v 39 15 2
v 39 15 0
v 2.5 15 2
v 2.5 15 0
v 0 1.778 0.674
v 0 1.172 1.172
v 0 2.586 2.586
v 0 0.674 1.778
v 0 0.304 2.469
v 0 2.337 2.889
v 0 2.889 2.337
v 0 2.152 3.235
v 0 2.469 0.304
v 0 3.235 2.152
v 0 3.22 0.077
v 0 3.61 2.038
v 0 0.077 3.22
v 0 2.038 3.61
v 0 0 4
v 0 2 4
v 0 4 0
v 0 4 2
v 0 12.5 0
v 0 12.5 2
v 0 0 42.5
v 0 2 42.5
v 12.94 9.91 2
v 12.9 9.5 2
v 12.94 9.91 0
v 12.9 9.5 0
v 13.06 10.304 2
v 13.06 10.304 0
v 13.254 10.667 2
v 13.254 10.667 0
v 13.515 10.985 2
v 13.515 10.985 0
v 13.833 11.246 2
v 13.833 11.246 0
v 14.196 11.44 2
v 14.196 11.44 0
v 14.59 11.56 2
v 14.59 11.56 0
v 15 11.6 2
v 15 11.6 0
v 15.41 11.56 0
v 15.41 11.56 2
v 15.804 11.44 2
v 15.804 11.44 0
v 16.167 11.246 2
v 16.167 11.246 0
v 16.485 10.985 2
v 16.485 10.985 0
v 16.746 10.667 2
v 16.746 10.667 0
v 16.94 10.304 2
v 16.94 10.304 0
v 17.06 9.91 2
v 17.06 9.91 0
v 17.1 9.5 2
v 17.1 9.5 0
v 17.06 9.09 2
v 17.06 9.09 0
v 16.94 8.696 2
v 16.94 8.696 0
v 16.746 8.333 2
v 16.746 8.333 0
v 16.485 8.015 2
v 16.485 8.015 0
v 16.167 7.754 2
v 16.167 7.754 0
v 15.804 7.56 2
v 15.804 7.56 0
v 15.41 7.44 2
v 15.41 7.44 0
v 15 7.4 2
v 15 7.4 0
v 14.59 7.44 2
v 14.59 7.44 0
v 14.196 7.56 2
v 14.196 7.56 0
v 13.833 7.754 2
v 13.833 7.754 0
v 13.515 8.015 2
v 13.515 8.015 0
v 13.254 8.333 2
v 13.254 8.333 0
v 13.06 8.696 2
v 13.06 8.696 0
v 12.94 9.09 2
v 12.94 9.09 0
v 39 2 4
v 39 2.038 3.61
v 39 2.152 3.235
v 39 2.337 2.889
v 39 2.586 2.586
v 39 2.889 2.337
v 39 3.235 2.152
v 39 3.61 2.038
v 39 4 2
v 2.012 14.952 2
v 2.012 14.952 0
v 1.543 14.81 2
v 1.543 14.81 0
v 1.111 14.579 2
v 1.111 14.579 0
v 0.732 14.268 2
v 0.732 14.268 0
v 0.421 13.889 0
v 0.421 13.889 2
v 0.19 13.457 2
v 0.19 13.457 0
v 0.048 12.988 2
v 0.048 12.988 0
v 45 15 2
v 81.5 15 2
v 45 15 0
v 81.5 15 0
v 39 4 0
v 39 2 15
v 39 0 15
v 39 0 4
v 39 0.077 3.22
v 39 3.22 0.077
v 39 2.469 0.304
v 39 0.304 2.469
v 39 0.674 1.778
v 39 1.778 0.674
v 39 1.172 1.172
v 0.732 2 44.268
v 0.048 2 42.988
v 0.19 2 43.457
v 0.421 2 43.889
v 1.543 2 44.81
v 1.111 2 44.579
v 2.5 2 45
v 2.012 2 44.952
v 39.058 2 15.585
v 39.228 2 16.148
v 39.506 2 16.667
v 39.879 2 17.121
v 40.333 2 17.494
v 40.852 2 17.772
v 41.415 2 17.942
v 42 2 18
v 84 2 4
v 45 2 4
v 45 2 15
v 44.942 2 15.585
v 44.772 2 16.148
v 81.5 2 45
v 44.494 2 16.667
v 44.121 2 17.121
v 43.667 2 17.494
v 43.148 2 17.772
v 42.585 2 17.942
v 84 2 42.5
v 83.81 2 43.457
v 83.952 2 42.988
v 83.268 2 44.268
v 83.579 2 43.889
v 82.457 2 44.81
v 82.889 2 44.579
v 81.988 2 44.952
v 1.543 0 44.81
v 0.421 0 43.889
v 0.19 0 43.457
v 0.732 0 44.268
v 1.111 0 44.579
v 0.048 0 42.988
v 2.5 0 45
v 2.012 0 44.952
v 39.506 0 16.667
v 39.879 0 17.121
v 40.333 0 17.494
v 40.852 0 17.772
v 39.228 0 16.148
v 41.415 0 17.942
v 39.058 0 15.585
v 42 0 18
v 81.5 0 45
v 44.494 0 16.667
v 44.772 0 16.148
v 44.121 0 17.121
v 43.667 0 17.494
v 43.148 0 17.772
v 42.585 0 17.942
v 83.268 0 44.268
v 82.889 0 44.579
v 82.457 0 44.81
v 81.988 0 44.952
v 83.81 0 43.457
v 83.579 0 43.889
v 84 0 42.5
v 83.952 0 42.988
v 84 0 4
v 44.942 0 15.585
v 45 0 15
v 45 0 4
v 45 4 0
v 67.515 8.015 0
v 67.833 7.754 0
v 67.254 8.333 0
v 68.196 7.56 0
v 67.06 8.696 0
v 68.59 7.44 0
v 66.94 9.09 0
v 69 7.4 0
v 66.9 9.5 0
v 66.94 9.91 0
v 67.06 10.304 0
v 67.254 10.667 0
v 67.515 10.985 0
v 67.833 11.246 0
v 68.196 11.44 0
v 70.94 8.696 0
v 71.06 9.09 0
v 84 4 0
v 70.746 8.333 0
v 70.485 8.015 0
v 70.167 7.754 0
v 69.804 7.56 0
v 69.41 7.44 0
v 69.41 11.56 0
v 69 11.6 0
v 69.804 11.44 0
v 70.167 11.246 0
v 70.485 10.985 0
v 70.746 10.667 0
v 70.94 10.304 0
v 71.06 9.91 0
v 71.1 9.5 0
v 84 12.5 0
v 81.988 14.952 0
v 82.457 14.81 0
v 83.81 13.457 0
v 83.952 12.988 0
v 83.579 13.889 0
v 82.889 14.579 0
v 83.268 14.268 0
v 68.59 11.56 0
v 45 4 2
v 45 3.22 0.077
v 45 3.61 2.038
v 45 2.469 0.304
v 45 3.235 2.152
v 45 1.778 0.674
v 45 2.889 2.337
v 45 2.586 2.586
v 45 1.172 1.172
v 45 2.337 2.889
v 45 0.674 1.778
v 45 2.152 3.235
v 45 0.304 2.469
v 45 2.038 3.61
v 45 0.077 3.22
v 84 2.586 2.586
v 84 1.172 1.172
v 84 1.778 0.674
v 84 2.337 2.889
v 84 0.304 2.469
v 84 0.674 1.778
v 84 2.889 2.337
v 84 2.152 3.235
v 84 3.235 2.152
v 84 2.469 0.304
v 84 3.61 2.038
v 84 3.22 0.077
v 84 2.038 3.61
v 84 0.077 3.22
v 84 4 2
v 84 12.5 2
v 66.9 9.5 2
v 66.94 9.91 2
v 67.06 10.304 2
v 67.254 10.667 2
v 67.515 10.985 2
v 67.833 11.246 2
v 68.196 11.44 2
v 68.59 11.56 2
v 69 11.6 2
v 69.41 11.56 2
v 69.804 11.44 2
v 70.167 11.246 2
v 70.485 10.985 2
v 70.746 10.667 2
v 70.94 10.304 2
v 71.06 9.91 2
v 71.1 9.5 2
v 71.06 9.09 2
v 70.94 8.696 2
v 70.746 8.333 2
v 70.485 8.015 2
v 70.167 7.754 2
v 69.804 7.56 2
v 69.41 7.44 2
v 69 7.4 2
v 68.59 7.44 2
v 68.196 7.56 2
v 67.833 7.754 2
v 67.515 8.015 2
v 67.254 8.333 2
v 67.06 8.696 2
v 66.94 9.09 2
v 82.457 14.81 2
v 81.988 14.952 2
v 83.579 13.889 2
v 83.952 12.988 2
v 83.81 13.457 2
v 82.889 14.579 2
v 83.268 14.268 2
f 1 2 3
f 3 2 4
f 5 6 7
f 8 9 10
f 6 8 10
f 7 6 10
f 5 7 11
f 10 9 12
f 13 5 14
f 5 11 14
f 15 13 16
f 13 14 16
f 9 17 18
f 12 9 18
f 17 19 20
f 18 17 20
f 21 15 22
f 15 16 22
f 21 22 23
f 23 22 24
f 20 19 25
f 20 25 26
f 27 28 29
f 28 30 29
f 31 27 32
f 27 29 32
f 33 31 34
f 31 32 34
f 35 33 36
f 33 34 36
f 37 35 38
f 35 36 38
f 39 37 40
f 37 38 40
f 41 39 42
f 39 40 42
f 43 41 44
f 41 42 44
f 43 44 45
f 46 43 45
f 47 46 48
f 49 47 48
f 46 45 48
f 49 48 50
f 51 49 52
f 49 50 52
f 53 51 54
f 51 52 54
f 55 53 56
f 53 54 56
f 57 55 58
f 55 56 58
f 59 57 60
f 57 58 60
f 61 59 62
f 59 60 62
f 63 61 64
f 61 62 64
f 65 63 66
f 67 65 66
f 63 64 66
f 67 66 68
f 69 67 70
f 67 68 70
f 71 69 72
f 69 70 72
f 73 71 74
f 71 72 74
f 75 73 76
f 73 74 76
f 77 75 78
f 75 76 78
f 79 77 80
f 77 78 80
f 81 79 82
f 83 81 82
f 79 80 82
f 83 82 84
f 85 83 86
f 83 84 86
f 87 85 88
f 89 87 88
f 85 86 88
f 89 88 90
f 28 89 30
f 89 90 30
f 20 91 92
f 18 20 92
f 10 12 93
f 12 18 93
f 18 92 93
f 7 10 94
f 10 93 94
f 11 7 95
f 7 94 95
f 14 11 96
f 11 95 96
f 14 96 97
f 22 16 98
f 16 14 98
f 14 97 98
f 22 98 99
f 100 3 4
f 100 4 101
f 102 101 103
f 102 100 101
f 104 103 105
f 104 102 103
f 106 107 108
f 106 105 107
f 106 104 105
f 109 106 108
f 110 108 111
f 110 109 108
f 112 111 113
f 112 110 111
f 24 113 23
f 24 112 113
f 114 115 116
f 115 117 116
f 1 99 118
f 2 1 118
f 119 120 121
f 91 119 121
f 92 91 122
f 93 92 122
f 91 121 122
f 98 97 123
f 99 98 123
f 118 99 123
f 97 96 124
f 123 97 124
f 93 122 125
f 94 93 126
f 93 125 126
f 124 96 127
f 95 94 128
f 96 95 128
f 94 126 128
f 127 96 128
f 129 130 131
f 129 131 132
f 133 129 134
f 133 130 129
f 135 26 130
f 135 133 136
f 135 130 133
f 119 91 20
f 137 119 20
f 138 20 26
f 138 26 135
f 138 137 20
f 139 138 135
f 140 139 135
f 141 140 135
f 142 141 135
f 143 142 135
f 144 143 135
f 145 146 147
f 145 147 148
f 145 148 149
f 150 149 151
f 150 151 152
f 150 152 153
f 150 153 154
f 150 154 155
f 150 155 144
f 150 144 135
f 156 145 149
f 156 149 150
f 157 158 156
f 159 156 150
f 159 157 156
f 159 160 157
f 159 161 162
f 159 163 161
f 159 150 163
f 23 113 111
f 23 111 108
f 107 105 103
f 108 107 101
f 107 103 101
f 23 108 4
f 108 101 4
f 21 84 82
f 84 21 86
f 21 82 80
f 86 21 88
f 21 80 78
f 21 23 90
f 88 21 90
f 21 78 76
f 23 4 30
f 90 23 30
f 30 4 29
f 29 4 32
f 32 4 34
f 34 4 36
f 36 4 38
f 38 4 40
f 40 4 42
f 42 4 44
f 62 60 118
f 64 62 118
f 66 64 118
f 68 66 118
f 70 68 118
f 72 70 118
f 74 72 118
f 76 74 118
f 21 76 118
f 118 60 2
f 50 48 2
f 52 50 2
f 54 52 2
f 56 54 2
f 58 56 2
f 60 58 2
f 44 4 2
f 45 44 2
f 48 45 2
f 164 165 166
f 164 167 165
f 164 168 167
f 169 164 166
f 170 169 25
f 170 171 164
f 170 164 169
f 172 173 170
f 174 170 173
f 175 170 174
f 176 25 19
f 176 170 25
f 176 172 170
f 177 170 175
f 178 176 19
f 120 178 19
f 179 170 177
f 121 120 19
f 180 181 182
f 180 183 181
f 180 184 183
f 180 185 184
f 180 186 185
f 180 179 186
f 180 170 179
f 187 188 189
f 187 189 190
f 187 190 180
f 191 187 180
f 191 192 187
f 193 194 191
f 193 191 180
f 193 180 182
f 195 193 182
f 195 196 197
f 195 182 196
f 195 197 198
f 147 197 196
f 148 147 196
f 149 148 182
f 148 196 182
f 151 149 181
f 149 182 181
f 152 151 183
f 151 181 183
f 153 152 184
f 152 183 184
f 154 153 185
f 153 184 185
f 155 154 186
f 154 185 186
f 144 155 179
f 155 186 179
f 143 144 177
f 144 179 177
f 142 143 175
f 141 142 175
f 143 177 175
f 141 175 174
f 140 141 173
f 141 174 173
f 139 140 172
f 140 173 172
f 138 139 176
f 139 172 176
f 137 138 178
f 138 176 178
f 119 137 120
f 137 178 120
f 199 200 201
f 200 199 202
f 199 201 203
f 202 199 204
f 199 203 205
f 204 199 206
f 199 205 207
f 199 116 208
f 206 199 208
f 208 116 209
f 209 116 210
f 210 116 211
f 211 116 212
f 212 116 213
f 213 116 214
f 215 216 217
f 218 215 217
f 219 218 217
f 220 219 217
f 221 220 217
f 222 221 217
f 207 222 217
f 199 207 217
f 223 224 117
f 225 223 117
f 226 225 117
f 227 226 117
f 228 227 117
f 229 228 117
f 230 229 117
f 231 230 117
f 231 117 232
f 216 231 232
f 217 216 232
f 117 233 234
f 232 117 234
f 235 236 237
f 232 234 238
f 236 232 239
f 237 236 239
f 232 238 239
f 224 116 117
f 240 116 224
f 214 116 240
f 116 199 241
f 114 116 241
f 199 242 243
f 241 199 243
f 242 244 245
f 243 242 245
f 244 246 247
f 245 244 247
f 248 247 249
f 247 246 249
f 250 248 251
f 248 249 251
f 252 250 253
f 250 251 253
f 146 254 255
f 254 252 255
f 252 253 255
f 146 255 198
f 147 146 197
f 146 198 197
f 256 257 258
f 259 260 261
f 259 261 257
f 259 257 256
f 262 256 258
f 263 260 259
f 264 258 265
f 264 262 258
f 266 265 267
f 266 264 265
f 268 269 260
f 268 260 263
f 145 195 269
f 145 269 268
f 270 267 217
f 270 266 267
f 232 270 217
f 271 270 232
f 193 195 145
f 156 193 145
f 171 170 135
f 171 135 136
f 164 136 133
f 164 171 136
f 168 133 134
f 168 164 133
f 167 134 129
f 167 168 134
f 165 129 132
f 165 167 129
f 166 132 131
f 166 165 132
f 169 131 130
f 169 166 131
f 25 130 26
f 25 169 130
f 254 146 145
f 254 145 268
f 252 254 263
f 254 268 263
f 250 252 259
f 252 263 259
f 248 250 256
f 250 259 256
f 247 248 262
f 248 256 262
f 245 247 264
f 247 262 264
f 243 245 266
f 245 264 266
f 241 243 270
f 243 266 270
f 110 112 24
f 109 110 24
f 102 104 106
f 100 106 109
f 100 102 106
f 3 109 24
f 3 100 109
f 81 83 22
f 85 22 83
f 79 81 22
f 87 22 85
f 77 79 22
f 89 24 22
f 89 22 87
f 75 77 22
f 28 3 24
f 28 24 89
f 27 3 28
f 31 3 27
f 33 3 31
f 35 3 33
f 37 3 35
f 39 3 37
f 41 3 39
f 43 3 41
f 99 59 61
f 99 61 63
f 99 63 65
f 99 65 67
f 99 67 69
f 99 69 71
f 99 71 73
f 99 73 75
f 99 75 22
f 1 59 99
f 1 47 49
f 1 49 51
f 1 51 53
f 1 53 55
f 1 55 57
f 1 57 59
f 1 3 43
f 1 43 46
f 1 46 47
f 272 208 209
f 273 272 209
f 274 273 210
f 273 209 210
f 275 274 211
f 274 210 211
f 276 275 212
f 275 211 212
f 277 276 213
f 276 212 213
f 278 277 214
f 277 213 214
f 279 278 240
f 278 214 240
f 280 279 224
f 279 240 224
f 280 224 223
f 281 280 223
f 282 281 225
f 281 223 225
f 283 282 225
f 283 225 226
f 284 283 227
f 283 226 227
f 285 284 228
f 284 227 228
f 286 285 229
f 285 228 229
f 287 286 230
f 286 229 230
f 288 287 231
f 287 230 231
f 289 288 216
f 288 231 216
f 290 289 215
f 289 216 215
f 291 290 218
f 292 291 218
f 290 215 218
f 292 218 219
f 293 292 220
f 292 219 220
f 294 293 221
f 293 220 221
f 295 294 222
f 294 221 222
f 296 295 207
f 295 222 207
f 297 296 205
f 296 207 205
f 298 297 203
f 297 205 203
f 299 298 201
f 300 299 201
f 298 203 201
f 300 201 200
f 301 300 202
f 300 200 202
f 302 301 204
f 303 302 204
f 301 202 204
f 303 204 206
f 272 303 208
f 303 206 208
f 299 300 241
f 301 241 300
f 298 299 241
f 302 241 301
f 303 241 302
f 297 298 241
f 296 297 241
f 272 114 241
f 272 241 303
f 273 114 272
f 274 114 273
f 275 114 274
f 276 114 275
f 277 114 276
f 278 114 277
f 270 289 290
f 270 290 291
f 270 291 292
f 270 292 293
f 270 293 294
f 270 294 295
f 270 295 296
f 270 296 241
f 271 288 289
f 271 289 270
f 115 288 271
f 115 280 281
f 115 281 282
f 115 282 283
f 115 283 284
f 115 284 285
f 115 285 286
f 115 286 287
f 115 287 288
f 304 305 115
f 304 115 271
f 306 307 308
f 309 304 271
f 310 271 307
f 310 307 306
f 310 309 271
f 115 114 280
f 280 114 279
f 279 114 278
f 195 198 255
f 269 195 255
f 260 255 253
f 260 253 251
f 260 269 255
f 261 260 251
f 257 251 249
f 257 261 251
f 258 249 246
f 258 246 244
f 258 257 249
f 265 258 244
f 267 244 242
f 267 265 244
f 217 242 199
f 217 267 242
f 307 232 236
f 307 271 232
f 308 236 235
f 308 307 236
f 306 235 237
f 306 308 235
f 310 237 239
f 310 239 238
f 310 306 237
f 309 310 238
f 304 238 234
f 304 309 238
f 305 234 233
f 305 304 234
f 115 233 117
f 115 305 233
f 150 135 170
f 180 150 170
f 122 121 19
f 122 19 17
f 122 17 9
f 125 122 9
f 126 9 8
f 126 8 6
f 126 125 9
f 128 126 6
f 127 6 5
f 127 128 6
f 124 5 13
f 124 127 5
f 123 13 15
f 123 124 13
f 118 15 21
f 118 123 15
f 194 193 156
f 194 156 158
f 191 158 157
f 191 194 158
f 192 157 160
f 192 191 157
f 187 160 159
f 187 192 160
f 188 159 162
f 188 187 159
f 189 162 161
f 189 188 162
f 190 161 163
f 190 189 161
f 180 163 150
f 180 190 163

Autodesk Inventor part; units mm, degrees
ref_plane "YZ Plane" through (0, 0, 0) normal (1, 0, 0) x (0, 1, 0)
ref_plane "XZ Plane" through (0, 0, 0) normal (0, 1, 0) x (-1, 0, 0)
ref_plane "XY Plane" through (0, 0, 0) normal (0, 0, 1) x (1, 0, 0)
sketch "Sketch1" plane through (0, 0, 0) normal (0, 0, 1) x (1, 0, 0)
  line L0 (0, 0) -> (84, 0)
  line L1 (84, 0) -> (84, 15)
  line L2 (84, 15) -> (0, 15)
  line L3 (0, 15) -> (0, 0)
  dimension "d0" = 84
  dimension "d1" = 15
extrude "Plate1" add sketch "Sketch1" along normal blind 2
sketch "Sketch2" plane through (84, 2, 0) normal (0, -1, 0) x (1, 0, 0)
  line L0 (-84, 0) -> (0, 0)
  line L1 (0, 0) -> (0, 45)
  line L2 (0, 45) -> (-84, 45)
  line L3 (-84, 45) -> (-84, 0)
edge flange "Flange1" height 45 angle 90 thickness 2 bend radius 2 thickness toward (0, -1, 0) relief tear relief width 2 relief depth 1 edges at (42, 0, 2) wall of the first edge with corners at (0, 2, 0) (84, 2, 0) (84, 2, 45) (0, 2, 45)
bend "Bend1"
corner "Corner1"
sketch "Sketch3" plane through (0, 0, 0) normal (0, 0, -1) x (-1, 0, 0)
  line L0 (-84, 4) -> (0, 4) projected
  line L1 (0, 15) -> (0, 4) projected
  line L2 (-84, 15) -> (0, 15) projected
  line L3 (-84, 4) -> (-84, 15) projected
  circle A0 centre (-15, 9.5) radius 2.1
  circle A1 centre (-69, 9.5) radius 2.1
  point P0 (0, 0)
  point P1 (-84, 9.5)
  dimension "d13" = 15
  dimension "d14" = 15
  dimension "d15" = 4.2
extrude "Cut1" cut sketch "Sketch3" against normal blind 2 contours A0 | A1
fillet "Corner Round1" radius 2.5 4 edges at (84, 15, 1) (0, 15, 1) (84, 1, 45) (0, 1, 45)
sketch "Sketch5" plane through (0, 0, 4) normal (0, -1, 0) x (1, 0, 0)
  arc A0 (84, 38.5) -> (81.5, 41) centre (81.5, 38.5) ccw projected
  line L0 (2.5, 41) -> (81.5, 41) projected
  arc A1 (2.5, 41) -> (0, 38.5) centre (2.5, 38.5) ccw projected
  line L1 (0, 0) -> (0, 38.5) projected
  line L2 (0, 0) -> (84, 0) projected
  line L3 (84, 38.5) -> (84, 0) projected
  line L4 (84, -4) -> (84, 0) projected
  line L5 (0, 0) -> (0, -4) projected
  line L6 (84, -4) -> (0, -4) projected
  line L7 (81.5, -4) -> (2.5, -4) projected
  line L8 (45, 11) -> (39, 11)
  line L9 (39, 11) -> (39, -4)
  line L10 (39, -4) -> (45, -4)
  line L11 (45, -4) -> (45, 11)
  line L12 (45, 11) -> (39, -4) construction
  line L13 (39, 11) -> (45, -4) construction
  circle A2 centre (42, 11) radius 3
  point P0 (42, 3.5)
  point P1 (42, -4)
  dimension "d24" = 6
  dimension "d25" = 15
extrude "Cut3" cut sketch "Sketch5" against normal through all contours L11 L6 L9 L2 | L2 L9 A2 L11 | A2 L8 | L8 A2
equation "\"d14\" = d13"
equation "\"d16\" = Thickness"
equation "\"d26\" = Thickness"
equation "\"d2\" = Thickness"
equation "\"d3\" = BendReliefWidth"
equation "\"d4\" = BendReliefDepth"
equation "\"d5\" = MinimumRemnant"
equation "\"d6\" = TransitionRadius"
equation "\"d9\" = BendRadius"
equation "\"d10\" = CornerReliefSize"
equation "\"d11\" = GapSize"
equation "\"d12\" = JacobiRadiusSize"
equation "\"BendRadius\" = Thickness"
equation "\"BendReliefWidth\" = Thickness"
equation "\"BendReliefDepth\" = 0.5 * Thickness"
equation "\"CornerReliefSize\" = 4 * Thickness"
equation "\"MinimumRemnant\" = 2 * Thickness"
equation "\"TransitionRadius\" = BendRadius"
equation "\"JacobiRadiusSize\" = BendRadius"
equation "\"GapSize\" = Thickness"
equation "\"Thickness\" = 2"
properties part number "backing plate lidar" material "Aluminum 6061"
